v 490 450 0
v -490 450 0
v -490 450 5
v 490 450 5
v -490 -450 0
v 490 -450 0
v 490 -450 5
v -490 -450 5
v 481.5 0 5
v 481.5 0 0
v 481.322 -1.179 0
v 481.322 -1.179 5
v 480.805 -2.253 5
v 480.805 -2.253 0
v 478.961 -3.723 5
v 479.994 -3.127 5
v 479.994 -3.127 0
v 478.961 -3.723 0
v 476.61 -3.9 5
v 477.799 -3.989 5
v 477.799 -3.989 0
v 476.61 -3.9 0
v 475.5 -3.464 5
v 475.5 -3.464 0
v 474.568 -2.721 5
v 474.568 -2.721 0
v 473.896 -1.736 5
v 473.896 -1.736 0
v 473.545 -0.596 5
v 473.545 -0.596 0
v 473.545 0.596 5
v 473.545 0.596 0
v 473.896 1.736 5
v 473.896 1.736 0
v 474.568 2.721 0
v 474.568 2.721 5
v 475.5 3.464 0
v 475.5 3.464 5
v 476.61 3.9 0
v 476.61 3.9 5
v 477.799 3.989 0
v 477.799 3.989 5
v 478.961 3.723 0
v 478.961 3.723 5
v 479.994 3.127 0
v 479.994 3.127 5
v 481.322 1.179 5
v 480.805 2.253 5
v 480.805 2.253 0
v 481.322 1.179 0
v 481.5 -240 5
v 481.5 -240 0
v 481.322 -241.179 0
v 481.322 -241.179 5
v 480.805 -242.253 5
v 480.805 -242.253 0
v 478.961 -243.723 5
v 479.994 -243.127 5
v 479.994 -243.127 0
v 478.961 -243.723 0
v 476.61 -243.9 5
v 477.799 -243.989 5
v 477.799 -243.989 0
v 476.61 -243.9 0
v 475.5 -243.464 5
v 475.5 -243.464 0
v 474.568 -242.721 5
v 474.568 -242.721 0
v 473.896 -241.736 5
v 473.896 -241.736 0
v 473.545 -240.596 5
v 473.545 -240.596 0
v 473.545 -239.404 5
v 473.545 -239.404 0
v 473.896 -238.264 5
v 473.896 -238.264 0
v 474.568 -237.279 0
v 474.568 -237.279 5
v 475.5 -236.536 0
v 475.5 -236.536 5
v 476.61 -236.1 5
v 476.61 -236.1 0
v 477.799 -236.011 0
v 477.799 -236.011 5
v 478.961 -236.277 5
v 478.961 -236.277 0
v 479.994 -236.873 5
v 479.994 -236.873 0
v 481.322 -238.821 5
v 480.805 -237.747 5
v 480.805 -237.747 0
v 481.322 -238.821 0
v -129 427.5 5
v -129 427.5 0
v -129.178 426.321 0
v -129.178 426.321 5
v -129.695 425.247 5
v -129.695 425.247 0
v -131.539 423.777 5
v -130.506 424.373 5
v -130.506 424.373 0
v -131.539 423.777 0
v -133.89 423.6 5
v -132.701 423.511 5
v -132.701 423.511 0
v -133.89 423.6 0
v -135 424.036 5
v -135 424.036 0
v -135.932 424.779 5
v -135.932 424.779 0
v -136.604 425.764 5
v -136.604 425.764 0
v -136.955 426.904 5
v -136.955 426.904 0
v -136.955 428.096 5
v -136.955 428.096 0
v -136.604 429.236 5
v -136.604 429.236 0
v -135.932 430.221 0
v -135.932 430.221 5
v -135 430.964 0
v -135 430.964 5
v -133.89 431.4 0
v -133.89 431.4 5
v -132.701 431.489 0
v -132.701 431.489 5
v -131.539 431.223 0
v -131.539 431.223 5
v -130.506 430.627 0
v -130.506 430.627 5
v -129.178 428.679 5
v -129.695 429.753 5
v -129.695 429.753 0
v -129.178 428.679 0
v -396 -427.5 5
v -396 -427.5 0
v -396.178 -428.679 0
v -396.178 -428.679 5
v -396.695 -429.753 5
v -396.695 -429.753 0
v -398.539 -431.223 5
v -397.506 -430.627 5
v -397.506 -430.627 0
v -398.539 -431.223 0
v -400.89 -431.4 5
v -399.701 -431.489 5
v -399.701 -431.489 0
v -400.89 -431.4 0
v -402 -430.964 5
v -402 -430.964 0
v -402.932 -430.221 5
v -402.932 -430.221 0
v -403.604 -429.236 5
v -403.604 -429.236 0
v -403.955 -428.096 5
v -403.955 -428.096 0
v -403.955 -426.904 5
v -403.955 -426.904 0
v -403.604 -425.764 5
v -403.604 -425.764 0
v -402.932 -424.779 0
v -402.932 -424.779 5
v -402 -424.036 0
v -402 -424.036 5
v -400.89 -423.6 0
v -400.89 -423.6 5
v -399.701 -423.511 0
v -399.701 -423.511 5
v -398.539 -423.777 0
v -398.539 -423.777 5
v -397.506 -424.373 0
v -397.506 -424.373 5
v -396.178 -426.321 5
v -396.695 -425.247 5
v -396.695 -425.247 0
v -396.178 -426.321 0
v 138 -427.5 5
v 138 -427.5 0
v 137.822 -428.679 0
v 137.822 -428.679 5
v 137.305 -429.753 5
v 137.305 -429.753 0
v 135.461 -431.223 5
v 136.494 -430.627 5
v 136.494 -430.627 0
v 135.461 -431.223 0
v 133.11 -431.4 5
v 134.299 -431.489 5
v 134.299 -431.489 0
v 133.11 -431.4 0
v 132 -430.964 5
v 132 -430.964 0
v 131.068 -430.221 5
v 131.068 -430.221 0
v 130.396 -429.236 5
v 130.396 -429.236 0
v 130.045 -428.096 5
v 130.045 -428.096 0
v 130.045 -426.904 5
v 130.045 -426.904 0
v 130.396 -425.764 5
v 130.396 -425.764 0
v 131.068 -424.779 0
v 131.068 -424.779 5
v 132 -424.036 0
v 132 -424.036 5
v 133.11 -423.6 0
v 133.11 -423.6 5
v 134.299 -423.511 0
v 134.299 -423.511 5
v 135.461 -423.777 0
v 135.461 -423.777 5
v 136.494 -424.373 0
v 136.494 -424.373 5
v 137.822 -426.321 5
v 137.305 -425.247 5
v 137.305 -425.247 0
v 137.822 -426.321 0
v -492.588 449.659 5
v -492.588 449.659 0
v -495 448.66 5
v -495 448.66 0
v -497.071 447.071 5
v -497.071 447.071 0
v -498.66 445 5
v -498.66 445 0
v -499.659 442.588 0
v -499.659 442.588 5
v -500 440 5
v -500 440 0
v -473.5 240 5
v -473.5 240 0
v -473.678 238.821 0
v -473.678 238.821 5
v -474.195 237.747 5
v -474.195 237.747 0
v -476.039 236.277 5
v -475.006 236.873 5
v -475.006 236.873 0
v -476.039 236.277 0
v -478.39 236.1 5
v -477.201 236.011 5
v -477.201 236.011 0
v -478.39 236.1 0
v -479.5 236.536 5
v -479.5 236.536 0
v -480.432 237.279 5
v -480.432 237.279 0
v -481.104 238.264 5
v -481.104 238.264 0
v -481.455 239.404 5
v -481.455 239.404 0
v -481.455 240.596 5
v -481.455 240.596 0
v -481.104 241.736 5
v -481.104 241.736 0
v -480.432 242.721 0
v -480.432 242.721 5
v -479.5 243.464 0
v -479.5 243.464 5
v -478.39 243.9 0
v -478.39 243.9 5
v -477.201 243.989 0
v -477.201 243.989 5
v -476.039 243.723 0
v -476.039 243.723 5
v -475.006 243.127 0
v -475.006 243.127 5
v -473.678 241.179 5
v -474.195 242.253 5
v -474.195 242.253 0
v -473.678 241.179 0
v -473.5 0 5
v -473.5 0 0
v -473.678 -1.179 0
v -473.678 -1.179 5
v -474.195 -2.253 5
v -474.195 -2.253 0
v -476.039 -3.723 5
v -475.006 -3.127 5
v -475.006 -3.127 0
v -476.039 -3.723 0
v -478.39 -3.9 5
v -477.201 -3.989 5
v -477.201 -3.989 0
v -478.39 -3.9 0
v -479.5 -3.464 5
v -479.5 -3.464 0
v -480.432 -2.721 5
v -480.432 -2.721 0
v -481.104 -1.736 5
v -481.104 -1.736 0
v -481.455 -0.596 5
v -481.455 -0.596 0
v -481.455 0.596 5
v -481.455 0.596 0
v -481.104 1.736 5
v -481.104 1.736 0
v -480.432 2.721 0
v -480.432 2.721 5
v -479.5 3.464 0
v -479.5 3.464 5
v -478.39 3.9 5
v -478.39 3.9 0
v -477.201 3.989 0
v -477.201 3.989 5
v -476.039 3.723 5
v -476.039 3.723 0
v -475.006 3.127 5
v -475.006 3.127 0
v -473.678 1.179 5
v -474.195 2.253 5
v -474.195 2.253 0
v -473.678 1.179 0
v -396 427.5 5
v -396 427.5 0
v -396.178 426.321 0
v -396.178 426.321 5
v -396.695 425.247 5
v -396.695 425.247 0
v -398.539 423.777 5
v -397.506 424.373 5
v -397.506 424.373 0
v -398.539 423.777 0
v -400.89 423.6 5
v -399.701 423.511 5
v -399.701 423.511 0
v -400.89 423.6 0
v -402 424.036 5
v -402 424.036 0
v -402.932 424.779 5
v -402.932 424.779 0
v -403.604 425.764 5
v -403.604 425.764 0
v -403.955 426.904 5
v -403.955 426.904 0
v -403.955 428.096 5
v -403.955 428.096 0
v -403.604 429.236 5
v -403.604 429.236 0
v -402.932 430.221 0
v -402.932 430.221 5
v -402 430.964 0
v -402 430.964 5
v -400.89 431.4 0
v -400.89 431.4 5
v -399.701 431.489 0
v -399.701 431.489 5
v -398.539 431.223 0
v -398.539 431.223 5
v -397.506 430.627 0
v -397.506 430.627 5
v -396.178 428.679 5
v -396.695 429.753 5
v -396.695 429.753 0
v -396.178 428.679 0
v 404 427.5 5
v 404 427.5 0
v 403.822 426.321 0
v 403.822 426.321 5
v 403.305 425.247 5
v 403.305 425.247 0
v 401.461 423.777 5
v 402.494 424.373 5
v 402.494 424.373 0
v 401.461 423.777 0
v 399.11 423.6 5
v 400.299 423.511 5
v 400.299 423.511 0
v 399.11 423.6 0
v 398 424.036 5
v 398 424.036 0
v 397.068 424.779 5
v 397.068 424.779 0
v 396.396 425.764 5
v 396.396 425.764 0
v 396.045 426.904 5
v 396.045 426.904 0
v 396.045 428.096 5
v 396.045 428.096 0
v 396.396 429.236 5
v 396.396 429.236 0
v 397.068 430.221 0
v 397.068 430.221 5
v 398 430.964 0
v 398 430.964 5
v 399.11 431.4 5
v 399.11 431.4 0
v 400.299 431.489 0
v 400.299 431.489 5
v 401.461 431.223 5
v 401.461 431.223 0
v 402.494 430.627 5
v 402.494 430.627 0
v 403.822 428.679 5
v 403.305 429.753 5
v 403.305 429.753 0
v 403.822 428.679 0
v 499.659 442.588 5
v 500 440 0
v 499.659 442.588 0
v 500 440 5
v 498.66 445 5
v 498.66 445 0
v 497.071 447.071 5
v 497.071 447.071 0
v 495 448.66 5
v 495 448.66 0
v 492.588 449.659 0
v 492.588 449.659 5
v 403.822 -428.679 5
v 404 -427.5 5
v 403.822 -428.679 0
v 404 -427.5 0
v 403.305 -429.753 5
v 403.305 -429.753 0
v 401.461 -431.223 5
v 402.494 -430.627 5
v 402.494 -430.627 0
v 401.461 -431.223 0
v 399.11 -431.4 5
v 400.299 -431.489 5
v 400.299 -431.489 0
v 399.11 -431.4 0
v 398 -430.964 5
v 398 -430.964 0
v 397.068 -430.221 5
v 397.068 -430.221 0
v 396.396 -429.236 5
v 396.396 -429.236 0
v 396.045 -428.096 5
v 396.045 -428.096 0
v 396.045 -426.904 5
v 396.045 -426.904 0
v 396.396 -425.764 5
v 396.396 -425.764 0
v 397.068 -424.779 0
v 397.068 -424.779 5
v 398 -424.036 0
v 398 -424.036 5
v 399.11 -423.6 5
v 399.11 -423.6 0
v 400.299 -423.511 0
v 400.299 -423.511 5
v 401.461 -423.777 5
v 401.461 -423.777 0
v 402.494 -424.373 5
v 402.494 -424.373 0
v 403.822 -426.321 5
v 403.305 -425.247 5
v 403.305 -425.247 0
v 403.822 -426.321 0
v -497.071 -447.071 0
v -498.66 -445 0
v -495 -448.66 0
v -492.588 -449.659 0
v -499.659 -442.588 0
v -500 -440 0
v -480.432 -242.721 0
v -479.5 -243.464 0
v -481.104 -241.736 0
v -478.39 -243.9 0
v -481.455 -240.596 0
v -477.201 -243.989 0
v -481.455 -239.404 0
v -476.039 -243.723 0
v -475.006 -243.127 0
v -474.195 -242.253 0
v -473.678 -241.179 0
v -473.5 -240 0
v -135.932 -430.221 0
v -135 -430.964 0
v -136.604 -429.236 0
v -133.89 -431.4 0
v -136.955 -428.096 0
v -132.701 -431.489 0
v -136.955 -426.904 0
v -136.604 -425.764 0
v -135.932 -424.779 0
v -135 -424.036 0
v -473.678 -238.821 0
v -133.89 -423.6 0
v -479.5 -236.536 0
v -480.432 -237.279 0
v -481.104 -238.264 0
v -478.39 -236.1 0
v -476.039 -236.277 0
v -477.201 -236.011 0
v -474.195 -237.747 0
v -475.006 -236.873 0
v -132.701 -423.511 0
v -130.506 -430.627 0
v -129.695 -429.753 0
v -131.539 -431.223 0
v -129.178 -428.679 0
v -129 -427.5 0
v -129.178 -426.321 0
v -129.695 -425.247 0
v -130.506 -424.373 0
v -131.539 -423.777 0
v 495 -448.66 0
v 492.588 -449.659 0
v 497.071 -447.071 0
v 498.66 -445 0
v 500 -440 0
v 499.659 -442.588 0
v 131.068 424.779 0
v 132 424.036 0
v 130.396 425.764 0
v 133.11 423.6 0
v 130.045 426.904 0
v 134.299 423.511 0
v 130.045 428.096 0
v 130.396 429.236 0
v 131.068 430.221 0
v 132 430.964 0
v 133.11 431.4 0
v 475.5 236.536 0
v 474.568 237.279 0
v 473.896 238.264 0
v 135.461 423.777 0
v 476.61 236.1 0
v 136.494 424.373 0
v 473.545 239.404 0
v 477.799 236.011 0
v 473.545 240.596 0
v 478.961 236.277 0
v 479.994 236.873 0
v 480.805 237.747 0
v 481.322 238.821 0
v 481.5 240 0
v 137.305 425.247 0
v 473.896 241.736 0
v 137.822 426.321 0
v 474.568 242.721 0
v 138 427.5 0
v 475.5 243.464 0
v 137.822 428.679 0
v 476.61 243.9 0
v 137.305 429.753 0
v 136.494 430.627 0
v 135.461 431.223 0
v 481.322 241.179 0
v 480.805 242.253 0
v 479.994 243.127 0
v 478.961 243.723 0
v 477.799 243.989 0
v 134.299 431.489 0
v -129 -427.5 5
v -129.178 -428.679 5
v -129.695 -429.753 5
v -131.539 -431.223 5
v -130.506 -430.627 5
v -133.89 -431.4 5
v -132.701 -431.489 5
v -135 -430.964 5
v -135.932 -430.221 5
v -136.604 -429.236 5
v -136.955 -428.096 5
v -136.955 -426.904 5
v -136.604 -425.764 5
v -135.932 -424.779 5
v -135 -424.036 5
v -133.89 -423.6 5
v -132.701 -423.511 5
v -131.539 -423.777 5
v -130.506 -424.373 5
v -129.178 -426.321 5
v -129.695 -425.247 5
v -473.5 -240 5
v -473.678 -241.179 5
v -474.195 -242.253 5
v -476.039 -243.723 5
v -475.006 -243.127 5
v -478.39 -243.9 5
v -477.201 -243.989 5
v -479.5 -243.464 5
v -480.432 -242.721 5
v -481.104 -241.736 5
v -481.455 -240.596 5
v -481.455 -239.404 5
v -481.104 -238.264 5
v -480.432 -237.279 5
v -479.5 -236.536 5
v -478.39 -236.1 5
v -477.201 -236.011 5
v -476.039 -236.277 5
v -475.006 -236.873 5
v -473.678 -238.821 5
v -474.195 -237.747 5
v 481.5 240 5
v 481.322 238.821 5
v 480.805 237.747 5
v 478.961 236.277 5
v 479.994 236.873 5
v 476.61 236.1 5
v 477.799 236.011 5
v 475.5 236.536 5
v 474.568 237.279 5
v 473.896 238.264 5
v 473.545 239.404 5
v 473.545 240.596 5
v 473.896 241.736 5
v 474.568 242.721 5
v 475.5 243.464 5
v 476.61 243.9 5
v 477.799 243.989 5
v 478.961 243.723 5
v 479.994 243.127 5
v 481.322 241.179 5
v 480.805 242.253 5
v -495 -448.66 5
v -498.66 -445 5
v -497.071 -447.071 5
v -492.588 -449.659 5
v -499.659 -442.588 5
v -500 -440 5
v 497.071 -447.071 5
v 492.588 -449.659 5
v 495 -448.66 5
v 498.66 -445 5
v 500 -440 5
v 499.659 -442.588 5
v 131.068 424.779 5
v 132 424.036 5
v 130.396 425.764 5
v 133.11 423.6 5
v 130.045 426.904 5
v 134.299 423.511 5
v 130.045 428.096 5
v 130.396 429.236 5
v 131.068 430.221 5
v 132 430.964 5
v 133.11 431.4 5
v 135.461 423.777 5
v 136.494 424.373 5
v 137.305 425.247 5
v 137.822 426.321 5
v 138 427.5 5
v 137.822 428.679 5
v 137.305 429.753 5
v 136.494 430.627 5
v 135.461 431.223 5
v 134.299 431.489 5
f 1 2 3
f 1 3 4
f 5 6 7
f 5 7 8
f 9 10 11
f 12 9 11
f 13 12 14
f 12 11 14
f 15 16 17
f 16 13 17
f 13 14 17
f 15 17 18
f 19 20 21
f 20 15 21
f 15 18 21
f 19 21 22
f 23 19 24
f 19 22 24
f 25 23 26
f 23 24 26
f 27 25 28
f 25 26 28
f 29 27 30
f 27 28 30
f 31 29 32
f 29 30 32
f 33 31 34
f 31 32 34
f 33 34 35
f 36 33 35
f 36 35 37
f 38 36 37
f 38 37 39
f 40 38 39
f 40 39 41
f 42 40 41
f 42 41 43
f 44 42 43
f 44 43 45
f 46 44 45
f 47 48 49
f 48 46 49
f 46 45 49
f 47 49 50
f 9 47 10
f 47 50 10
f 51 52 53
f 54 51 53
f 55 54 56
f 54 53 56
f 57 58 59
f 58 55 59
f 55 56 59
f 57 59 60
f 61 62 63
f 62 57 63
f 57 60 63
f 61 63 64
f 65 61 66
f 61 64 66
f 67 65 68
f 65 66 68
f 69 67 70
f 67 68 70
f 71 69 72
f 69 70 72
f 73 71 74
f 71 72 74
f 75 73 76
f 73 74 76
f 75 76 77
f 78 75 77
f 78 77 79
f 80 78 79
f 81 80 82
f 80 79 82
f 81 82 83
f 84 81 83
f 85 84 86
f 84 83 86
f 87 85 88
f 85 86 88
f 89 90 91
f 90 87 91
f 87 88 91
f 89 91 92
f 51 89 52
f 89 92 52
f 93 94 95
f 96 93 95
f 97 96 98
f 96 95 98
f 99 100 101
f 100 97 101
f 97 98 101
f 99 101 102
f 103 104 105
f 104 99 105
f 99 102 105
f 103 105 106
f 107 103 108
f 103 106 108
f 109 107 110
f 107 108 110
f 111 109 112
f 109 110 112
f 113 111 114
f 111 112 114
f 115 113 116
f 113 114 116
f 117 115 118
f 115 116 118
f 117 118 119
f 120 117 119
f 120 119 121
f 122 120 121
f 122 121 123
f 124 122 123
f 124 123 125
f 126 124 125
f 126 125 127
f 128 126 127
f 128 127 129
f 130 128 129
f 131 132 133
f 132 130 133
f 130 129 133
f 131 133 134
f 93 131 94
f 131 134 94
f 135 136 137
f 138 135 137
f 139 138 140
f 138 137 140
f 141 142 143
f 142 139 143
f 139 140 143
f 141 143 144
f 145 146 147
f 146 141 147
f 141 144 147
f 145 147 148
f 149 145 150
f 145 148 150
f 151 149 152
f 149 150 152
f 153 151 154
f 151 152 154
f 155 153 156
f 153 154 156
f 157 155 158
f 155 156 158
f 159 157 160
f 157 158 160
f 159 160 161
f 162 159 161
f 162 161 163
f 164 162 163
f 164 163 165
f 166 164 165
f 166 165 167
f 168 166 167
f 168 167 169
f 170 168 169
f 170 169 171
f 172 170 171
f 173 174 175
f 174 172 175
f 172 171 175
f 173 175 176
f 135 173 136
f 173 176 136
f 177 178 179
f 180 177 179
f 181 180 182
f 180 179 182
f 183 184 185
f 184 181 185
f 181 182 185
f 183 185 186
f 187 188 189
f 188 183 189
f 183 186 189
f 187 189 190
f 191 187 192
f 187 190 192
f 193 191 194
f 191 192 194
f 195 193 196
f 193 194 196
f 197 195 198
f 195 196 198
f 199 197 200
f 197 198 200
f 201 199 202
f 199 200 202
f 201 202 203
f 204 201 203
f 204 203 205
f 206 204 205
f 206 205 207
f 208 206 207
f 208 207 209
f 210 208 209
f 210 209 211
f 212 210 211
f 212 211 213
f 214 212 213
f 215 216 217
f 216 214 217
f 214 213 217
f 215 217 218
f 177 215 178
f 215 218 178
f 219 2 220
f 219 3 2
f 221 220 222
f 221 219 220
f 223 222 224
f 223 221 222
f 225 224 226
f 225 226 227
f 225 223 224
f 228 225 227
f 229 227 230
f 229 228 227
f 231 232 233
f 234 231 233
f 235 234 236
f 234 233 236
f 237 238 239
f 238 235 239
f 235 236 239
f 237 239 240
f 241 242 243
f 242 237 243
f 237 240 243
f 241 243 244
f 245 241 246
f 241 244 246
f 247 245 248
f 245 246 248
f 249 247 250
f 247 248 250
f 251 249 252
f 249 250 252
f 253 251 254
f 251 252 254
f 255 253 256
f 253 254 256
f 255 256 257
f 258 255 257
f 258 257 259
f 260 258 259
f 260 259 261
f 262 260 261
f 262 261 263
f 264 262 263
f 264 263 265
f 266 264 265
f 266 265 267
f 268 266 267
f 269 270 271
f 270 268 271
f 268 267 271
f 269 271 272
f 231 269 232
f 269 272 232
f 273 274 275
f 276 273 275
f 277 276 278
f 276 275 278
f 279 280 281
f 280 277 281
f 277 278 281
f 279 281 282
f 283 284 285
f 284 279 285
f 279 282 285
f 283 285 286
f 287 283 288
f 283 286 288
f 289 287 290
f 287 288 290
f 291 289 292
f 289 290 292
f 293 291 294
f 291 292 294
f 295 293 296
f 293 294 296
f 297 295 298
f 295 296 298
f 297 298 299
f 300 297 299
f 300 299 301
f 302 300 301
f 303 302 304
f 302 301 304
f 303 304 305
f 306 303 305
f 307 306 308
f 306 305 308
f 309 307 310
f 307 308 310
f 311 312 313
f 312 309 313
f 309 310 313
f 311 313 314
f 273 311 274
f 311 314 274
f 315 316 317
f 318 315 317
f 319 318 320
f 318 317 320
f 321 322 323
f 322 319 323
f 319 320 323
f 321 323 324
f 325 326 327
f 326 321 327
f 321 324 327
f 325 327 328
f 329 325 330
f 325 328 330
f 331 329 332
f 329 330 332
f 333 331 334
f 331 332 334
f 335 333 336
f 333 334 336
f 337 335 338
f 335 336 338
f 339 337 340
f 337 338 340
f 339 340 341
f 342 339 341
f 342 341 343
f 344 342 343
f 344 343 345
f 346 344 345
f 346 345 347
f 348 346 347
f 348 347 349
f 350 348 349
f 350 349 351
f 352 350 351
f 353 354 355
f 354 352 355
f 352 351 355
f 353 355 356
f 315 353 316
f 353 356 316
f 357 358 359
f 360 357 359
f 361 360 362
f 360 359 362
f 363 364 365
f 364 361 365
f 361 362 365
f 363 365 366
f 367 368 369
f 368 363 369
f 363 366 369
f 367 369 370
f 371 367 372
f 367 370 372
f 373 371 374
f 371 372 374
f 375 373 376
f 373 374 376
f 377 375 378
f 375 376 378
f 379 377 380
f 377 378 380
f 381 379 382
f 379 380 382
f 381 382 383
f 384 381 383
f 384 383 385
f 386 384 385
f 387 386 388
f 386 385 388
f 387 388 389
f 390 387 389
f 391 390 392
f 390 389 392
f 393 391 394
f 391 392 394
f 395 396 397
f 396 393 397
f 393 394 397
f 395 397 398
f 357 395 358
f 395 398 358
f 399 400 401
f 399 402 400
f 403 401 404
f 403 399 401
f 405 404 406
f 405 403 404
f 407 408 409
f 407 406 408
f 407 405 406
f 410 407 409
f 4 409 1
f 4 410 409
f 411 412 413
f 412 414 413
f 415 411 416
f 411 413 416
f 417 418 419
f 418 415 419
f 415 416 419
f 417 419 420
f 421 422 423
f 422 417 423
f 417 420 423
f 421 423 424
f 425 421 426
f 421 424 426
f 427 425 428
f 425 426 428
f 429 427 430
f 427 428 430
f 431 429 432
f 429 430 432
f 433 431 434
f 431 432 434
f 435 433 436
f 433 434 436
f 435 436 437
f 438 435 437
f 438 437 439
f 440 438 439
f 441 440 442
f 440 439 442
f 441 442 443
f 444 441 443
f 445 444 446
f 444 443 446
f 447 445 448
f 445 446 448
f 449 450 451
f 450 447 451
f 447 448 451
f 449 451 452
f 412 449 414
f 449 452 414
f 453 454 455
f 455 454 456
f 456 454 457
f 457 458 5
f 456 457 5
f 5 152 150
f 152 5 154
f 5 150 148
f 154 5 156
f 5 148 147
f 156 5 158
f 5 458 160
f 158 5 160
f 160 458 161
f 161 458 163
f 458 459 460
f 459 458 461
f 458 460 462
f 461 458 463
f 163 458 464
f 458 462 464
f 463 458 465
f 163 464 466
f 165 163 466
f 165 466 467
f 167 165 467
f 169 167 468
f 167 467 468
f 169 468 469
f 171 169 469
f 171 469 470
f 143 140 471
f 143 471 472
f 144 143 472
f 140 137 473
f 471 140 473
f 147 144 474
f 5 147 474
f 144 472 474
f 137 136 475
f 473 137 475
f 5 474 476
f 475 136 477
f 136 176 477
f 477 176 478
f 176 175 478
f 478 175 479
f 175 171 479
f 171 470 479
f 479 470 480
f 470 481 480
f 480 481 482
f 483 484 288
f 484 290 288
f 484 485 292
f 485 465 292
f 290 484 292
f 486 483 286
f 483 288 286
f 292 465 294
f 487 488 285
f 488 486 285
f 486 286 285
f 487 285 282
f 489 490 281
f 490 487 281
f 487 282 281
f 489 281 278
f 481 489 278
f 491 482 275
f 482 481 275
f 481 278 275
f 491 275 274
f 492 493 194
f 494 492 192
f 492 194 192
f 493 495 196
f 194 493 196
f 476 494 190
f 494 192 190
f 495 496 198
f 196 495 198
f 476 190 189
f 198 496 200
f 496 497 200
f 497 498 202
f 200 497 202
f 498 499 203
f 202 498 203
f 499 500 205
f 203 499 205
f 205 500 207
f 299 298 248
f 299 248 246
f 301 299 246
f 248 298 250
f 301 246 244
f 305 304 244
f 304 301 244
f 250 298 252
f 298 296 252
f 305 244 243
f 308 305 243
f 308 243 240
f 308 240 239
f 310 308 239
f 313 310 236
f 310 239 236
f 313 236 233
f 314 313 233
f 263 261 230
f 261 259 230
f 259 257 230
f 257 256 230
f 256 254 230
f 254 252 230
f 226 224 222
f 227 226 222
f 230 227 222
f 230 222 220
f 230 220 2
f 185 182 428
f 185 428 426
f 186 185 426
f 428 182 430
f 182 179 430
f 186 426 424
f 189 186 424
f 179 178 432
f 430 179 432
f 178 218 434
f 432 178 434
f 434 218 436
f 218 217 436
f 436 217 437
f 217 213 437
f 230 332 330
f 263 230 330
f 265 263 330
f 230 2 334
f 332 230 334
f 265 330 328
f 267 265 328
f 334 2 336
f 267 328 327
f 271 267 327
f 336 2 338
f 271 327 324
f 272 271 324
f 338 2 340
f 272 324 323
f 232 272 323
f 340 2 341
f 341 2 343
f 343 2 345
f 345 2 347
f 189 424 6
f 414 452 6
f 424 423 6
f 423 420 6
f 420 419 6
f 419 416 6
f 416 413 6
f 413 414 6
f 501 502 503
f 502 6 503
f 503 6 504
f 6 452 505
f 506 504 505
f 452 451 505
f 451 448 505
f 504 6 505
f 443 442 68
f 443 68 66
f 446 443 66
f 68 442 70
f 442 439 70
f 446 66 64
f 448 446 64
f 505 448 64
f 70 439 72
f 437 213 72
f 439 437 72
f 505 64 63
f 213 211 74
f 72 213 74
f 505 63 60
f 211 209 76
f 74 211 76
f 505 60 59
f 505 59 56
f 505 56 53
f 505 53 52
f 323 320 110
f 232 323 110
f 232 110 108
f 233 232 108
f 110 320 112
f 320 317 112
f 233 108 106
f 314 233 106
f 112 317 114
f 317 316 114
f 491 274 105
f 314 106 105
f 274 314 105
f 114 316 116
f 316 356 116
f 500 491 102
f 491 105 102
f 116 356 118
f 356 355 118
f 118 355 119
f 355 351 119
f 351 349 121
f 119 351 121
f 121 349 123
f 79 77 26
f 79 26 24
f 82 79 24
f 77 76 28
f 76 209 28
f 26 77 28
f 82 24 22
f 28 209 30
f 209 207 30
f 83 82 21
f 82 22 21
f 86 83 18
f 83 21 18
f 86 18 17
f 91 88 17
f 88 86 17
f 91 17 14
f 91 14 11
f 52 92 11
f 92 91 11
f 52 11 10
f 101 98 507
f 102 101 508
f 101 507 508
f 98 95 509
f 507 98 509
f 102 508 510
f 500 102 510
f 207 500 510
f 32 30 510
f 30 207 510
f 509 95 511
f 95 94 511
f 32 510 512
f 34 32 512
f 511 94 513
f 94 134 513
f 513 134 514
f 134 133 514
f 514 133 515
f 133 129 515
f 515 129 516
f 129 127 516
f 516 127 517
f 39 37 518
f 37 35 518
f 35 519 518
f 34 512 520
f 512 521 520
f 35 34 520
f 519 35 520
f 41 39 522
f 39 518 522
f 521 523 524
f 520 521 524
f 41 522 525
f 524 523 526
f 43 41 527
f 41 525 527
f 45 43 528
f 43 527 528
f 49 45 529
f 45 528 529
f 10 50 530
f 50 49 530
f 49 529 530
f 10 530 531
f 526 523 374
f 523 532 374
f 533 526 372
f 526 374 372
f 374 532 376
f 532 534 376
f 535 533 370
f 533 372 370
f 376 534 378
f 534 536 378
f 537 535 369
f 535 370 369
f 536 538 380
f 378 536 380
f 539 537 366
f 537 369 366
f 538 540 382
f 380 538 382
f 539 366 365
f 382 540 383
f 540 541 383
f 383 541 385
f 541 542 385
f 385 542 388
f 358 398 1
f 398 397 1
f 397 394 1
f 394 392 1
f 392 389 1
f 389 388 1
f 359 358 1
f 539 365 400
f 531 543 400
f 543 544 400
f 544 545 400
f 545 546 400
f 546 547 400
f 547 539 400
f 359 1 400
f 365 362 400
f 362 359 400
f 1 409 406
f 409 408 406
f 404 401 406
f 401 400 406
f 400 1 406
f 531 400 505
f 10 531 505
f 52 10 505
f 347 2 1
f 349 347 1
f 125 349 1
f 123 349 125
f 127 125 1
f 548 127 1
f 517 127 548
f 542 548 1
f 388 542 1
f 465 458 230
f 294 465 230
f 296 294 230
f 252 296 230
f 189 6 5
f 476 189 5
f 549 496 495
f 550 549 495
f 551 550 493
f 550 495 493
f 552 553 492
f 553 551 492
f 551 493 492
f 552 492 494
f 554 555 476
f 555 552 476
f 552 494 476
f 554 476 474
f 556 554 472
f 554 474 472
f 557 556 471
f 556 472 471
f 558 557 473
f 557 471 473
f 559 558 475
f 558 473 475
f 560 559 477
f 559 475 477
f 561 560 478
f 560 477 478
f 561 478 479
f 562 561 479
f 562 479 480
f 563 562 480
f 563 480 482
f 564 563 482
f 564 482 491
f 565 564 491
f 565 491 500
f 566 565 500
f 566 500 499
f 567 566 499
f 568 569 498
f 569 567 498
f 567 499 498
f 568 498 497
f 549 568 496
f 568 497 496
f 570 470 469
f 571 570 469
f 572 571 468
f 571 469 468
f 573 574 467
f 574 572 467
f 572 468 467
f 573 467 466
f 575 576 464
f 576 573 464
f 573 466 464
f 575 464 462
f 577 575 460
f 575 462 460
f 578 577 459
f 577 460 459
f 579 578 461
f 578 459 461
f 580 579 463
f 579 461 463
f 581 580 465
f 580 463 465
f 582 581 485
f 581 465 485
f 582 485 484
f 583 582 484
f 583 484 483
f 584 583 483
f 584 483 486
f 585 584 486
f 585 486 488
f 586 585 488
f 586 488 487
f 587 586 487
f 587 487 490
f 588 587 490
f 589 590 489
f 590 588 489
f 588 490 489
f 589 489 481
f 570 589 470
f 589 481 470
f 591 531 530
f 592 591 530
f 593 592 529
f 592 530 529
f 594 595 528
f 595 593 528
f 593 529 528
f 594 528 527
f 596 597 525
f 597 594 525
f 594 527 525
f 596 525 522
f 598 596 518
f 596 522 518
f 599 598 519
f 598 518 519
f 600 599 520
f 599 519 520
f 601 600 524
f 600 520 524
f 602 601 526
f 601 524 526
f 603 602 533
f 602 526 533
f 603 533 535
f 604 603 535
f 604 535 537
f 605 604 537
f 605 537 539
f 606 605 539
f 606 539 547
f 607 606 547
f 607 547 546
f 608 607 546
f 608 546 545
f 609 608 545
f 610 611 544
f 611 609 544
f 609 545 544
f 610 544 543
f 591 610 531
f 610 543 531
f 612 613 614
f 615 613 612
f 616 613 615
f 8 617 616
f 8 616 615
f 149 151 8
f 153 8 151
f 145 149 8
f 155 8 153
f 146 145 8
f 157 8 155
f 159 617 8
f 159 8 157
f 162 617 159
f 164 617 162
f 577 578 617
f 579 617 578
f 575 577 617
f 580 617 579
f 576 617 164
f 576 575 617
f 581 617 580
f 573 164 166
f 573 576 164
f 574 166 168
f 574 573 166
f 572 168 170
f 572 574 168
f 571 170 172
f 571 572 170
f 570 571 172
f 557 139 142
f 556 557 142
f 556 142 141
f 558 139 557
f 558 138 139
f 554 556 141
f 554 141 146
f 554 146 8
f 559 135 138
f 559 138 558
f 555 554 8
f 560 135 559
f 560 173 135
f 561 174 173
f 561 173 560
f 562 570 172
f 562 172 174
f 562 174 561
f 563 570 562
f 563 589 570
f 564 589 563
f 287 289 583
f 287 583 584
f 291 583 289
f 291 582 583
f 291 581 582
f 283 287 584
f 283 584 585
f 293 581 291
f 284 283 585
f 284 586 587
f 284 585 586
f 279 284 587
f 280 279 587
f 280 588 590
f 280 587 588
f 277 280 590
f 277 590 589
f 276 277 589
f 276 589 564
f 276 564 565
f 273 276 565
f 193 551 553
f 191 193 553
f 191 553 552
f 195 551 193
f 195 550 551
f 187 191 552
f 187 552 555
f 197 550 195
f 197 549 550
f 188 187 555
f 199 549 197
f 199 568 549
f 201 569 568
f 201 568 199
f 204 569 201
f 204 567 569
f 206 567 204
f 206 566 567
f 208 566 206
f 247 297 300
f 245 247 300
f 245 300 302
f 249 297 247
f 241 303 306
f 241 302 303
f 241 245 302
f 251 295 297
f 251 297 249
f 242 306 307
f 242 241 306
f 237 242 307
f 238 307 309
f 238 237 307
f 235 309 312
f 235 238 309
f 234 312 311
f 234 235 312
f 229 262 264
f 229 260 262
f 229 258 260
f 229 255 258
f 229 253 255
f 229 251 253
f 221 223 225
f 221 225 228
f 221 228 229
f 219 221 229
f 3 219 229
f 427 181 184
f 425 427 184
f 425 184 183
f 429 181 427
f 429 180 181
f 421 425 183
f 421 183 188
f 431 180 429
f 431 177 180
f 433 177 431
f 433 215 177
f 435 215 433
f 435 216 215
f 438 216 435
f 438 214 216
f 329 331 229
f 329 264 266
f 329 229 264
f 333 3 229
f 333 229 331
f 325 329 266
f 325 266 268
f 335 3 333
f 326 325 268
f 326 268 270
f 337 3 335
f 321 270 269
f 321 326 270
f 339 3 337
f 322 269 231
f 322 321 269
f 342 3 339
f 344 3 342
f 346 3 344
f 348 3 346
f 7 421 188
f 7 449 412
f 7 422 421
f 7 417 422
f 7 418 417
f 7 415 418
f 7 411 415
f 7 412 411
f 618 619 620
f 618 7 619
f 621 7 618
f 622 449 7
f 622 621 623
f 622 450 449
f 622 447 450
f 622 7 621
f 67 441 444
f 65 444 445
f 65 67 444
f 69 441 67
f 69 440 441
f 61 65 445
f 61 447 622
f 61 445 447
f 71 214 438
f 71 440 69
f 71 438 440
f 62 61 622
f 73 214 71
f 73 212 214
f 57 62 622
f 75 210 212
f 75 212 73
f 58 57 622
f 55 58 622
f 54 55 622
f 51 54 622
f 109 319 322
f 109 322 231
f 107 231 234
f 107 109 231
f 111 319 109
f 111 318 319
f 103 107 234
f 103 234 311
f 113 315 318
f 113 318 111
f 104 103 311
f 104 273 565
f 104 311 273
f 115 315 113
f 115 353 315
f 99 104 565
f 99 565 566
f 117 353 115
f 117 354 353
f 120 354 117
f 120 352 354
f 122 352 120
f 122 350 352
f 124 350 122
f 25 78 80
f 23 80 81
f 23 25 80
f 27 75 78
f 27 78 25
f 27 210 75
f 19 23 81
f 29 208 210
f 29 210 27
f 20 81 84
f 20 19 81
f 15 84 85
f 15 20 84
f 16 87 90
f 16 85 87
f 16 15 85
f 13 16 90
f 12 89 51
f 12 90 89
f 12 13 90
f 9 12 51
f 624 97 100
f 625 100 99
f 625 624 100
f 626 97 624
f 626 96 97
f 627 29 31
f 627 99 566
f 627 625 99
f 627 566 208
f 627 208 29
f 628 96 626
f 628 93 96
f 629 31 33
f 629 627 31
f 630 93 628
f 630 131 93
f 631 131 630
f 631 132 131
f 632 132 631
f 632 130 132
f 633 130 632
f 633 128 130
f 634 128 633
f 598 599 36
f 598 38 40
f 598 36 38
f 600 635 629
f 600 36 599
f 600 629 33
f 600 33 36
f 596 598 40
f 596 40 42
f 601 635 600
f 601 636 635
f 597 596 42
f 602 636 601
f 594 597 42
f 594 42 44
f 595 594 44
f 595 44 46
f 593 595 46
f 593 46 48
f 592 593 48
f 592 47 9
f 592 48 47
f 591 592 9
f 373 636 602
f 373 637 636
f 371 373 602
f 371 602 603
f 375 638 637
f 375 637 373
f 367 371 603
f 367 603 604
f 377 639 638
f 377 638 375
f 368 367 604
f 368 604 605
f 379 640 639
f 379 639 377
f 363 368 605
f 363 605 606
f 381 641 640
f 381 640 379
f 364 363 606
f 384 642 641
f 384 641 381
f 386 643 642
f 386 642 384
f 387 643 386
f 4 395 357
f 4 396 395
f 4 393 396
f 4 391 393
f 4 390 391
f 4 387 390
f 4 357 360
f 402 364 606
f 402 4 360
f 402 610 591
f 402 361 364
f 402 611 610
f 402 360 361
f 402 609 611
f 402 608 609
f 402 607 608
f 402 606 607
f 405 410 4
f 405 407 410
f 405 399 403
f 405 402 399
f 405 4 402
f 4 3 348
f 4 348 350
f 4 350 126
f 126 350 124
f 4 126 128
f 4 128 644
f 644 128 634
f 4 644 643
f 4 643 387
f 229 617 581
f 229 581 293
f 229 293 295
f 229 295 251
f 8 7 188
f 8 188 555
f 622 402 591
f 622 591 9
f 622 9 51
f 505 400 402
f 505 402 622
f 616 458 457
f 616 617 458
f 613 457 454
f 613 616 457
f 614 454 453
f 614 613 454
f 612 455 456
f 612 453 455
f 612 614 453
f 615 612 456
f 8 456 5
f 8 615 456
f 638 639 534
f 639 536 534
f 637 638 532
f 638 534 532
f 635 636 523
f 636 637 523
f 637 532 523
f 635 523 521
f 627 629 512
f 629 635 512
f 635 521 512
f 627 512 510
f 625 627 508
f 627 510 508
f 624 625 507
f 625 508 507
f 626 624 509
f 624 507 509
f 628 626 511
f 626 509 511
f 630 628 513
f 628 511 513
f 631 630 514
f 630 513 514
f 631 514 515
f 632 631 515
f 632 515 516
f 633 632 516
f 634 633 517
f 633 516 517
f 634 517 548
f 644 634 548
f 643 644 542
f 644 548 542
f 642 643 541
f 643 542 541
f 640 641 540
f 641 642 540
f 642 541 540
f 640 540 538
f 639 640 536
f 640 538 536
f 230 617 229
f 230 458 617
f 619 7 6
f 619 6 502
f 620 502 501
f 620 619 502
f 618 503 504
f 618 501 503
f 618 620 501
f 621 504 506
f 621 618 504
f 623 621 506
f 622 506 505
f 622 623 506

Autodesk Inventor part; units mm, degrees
ref_plane "YZ Plane" through (0, 0, 0) normal (1, 0, 0) x (0, 1, 0)
ref_plane "XZ Plane" through (0, 0, 0) normal (0, 1, 0) x (-1, 0, 0)
ref_plane "XY Plane" through (0, 0, 0) normal (0, 0, 1) x (1, 0, 0)
sketch "Boceto1" plane through (0, 0, 0) normal (0, 0, 1) x (1, 0, 0)
  line L0 (-500, 450) -> (500, 450)
  line L1 (500, 450) -> (500, -450)
  line L2 (500, -450) -> (-500, -450)
  line L3 (-500, -450) -> (-500, 450)
  circle A0 centre (-400, 427.5) radius 4
  circle A1 centre (400, 427.5) radius 4
  circle A2 centre (-133, 427.5) radius 4
  circle A3 centre (134, 427.5) radius 4
  circle A4 centre (-400, -427.5) radius 4
  circle A5 centre (-133, -427.5) radius 4
  circle A6 centre (134, -427.5) radius 4
  circle A7 centre (400, -427.5) radius 4
  circle A8 centre (-477.5, 240) radius 4
  circle A9 centre (-477.5, 0) radius 4
  circle A10 centre (-477.5, -240) radius 4
  circle A11 centre (477.5, 240) radius 4
  circle A12 centre (477.5, 0) radius 4
  circle A13 centre (477.5, -240) radius 4
  point P0 (0, 0)
  point P1 (0, 450)
  point P2 (500, 0)
  point P3 (-500, 0)
  dimension "d0" = 1000
  dimension "d4" = 900
  dimension "d5" = 8
  dimension "d6" = 22.5
  dimension "d7" = 100
  dimension "d8" = 100
  dimension "d9" = 267
  dimension "d10" = 267
  dimension "d11" = 22.5
  dimension "d12" = 22.5
  dimension "d14" = 240
  dimension "d15" = 240
  dimension "d16" = 22.5
extrude "Extrusión1" add sketch "Boceto1" along normal blind 5
fillet "Empalme1" radius 10 4 edges at (500, 450, 2.5) (-500, 450, 2.5) (500, -450, 2.5) (-500, -450, 2.5)
equation "\"d8\" = d7"
equation "\"d10\" = d9"
equation "\"d11\" = d6"
equation "\"d12\" = d11"
equation "\"d15\" = d14"
equation "\"d16\" = d12"
properties part number "1mx1m" material "Hierro, fundido"
